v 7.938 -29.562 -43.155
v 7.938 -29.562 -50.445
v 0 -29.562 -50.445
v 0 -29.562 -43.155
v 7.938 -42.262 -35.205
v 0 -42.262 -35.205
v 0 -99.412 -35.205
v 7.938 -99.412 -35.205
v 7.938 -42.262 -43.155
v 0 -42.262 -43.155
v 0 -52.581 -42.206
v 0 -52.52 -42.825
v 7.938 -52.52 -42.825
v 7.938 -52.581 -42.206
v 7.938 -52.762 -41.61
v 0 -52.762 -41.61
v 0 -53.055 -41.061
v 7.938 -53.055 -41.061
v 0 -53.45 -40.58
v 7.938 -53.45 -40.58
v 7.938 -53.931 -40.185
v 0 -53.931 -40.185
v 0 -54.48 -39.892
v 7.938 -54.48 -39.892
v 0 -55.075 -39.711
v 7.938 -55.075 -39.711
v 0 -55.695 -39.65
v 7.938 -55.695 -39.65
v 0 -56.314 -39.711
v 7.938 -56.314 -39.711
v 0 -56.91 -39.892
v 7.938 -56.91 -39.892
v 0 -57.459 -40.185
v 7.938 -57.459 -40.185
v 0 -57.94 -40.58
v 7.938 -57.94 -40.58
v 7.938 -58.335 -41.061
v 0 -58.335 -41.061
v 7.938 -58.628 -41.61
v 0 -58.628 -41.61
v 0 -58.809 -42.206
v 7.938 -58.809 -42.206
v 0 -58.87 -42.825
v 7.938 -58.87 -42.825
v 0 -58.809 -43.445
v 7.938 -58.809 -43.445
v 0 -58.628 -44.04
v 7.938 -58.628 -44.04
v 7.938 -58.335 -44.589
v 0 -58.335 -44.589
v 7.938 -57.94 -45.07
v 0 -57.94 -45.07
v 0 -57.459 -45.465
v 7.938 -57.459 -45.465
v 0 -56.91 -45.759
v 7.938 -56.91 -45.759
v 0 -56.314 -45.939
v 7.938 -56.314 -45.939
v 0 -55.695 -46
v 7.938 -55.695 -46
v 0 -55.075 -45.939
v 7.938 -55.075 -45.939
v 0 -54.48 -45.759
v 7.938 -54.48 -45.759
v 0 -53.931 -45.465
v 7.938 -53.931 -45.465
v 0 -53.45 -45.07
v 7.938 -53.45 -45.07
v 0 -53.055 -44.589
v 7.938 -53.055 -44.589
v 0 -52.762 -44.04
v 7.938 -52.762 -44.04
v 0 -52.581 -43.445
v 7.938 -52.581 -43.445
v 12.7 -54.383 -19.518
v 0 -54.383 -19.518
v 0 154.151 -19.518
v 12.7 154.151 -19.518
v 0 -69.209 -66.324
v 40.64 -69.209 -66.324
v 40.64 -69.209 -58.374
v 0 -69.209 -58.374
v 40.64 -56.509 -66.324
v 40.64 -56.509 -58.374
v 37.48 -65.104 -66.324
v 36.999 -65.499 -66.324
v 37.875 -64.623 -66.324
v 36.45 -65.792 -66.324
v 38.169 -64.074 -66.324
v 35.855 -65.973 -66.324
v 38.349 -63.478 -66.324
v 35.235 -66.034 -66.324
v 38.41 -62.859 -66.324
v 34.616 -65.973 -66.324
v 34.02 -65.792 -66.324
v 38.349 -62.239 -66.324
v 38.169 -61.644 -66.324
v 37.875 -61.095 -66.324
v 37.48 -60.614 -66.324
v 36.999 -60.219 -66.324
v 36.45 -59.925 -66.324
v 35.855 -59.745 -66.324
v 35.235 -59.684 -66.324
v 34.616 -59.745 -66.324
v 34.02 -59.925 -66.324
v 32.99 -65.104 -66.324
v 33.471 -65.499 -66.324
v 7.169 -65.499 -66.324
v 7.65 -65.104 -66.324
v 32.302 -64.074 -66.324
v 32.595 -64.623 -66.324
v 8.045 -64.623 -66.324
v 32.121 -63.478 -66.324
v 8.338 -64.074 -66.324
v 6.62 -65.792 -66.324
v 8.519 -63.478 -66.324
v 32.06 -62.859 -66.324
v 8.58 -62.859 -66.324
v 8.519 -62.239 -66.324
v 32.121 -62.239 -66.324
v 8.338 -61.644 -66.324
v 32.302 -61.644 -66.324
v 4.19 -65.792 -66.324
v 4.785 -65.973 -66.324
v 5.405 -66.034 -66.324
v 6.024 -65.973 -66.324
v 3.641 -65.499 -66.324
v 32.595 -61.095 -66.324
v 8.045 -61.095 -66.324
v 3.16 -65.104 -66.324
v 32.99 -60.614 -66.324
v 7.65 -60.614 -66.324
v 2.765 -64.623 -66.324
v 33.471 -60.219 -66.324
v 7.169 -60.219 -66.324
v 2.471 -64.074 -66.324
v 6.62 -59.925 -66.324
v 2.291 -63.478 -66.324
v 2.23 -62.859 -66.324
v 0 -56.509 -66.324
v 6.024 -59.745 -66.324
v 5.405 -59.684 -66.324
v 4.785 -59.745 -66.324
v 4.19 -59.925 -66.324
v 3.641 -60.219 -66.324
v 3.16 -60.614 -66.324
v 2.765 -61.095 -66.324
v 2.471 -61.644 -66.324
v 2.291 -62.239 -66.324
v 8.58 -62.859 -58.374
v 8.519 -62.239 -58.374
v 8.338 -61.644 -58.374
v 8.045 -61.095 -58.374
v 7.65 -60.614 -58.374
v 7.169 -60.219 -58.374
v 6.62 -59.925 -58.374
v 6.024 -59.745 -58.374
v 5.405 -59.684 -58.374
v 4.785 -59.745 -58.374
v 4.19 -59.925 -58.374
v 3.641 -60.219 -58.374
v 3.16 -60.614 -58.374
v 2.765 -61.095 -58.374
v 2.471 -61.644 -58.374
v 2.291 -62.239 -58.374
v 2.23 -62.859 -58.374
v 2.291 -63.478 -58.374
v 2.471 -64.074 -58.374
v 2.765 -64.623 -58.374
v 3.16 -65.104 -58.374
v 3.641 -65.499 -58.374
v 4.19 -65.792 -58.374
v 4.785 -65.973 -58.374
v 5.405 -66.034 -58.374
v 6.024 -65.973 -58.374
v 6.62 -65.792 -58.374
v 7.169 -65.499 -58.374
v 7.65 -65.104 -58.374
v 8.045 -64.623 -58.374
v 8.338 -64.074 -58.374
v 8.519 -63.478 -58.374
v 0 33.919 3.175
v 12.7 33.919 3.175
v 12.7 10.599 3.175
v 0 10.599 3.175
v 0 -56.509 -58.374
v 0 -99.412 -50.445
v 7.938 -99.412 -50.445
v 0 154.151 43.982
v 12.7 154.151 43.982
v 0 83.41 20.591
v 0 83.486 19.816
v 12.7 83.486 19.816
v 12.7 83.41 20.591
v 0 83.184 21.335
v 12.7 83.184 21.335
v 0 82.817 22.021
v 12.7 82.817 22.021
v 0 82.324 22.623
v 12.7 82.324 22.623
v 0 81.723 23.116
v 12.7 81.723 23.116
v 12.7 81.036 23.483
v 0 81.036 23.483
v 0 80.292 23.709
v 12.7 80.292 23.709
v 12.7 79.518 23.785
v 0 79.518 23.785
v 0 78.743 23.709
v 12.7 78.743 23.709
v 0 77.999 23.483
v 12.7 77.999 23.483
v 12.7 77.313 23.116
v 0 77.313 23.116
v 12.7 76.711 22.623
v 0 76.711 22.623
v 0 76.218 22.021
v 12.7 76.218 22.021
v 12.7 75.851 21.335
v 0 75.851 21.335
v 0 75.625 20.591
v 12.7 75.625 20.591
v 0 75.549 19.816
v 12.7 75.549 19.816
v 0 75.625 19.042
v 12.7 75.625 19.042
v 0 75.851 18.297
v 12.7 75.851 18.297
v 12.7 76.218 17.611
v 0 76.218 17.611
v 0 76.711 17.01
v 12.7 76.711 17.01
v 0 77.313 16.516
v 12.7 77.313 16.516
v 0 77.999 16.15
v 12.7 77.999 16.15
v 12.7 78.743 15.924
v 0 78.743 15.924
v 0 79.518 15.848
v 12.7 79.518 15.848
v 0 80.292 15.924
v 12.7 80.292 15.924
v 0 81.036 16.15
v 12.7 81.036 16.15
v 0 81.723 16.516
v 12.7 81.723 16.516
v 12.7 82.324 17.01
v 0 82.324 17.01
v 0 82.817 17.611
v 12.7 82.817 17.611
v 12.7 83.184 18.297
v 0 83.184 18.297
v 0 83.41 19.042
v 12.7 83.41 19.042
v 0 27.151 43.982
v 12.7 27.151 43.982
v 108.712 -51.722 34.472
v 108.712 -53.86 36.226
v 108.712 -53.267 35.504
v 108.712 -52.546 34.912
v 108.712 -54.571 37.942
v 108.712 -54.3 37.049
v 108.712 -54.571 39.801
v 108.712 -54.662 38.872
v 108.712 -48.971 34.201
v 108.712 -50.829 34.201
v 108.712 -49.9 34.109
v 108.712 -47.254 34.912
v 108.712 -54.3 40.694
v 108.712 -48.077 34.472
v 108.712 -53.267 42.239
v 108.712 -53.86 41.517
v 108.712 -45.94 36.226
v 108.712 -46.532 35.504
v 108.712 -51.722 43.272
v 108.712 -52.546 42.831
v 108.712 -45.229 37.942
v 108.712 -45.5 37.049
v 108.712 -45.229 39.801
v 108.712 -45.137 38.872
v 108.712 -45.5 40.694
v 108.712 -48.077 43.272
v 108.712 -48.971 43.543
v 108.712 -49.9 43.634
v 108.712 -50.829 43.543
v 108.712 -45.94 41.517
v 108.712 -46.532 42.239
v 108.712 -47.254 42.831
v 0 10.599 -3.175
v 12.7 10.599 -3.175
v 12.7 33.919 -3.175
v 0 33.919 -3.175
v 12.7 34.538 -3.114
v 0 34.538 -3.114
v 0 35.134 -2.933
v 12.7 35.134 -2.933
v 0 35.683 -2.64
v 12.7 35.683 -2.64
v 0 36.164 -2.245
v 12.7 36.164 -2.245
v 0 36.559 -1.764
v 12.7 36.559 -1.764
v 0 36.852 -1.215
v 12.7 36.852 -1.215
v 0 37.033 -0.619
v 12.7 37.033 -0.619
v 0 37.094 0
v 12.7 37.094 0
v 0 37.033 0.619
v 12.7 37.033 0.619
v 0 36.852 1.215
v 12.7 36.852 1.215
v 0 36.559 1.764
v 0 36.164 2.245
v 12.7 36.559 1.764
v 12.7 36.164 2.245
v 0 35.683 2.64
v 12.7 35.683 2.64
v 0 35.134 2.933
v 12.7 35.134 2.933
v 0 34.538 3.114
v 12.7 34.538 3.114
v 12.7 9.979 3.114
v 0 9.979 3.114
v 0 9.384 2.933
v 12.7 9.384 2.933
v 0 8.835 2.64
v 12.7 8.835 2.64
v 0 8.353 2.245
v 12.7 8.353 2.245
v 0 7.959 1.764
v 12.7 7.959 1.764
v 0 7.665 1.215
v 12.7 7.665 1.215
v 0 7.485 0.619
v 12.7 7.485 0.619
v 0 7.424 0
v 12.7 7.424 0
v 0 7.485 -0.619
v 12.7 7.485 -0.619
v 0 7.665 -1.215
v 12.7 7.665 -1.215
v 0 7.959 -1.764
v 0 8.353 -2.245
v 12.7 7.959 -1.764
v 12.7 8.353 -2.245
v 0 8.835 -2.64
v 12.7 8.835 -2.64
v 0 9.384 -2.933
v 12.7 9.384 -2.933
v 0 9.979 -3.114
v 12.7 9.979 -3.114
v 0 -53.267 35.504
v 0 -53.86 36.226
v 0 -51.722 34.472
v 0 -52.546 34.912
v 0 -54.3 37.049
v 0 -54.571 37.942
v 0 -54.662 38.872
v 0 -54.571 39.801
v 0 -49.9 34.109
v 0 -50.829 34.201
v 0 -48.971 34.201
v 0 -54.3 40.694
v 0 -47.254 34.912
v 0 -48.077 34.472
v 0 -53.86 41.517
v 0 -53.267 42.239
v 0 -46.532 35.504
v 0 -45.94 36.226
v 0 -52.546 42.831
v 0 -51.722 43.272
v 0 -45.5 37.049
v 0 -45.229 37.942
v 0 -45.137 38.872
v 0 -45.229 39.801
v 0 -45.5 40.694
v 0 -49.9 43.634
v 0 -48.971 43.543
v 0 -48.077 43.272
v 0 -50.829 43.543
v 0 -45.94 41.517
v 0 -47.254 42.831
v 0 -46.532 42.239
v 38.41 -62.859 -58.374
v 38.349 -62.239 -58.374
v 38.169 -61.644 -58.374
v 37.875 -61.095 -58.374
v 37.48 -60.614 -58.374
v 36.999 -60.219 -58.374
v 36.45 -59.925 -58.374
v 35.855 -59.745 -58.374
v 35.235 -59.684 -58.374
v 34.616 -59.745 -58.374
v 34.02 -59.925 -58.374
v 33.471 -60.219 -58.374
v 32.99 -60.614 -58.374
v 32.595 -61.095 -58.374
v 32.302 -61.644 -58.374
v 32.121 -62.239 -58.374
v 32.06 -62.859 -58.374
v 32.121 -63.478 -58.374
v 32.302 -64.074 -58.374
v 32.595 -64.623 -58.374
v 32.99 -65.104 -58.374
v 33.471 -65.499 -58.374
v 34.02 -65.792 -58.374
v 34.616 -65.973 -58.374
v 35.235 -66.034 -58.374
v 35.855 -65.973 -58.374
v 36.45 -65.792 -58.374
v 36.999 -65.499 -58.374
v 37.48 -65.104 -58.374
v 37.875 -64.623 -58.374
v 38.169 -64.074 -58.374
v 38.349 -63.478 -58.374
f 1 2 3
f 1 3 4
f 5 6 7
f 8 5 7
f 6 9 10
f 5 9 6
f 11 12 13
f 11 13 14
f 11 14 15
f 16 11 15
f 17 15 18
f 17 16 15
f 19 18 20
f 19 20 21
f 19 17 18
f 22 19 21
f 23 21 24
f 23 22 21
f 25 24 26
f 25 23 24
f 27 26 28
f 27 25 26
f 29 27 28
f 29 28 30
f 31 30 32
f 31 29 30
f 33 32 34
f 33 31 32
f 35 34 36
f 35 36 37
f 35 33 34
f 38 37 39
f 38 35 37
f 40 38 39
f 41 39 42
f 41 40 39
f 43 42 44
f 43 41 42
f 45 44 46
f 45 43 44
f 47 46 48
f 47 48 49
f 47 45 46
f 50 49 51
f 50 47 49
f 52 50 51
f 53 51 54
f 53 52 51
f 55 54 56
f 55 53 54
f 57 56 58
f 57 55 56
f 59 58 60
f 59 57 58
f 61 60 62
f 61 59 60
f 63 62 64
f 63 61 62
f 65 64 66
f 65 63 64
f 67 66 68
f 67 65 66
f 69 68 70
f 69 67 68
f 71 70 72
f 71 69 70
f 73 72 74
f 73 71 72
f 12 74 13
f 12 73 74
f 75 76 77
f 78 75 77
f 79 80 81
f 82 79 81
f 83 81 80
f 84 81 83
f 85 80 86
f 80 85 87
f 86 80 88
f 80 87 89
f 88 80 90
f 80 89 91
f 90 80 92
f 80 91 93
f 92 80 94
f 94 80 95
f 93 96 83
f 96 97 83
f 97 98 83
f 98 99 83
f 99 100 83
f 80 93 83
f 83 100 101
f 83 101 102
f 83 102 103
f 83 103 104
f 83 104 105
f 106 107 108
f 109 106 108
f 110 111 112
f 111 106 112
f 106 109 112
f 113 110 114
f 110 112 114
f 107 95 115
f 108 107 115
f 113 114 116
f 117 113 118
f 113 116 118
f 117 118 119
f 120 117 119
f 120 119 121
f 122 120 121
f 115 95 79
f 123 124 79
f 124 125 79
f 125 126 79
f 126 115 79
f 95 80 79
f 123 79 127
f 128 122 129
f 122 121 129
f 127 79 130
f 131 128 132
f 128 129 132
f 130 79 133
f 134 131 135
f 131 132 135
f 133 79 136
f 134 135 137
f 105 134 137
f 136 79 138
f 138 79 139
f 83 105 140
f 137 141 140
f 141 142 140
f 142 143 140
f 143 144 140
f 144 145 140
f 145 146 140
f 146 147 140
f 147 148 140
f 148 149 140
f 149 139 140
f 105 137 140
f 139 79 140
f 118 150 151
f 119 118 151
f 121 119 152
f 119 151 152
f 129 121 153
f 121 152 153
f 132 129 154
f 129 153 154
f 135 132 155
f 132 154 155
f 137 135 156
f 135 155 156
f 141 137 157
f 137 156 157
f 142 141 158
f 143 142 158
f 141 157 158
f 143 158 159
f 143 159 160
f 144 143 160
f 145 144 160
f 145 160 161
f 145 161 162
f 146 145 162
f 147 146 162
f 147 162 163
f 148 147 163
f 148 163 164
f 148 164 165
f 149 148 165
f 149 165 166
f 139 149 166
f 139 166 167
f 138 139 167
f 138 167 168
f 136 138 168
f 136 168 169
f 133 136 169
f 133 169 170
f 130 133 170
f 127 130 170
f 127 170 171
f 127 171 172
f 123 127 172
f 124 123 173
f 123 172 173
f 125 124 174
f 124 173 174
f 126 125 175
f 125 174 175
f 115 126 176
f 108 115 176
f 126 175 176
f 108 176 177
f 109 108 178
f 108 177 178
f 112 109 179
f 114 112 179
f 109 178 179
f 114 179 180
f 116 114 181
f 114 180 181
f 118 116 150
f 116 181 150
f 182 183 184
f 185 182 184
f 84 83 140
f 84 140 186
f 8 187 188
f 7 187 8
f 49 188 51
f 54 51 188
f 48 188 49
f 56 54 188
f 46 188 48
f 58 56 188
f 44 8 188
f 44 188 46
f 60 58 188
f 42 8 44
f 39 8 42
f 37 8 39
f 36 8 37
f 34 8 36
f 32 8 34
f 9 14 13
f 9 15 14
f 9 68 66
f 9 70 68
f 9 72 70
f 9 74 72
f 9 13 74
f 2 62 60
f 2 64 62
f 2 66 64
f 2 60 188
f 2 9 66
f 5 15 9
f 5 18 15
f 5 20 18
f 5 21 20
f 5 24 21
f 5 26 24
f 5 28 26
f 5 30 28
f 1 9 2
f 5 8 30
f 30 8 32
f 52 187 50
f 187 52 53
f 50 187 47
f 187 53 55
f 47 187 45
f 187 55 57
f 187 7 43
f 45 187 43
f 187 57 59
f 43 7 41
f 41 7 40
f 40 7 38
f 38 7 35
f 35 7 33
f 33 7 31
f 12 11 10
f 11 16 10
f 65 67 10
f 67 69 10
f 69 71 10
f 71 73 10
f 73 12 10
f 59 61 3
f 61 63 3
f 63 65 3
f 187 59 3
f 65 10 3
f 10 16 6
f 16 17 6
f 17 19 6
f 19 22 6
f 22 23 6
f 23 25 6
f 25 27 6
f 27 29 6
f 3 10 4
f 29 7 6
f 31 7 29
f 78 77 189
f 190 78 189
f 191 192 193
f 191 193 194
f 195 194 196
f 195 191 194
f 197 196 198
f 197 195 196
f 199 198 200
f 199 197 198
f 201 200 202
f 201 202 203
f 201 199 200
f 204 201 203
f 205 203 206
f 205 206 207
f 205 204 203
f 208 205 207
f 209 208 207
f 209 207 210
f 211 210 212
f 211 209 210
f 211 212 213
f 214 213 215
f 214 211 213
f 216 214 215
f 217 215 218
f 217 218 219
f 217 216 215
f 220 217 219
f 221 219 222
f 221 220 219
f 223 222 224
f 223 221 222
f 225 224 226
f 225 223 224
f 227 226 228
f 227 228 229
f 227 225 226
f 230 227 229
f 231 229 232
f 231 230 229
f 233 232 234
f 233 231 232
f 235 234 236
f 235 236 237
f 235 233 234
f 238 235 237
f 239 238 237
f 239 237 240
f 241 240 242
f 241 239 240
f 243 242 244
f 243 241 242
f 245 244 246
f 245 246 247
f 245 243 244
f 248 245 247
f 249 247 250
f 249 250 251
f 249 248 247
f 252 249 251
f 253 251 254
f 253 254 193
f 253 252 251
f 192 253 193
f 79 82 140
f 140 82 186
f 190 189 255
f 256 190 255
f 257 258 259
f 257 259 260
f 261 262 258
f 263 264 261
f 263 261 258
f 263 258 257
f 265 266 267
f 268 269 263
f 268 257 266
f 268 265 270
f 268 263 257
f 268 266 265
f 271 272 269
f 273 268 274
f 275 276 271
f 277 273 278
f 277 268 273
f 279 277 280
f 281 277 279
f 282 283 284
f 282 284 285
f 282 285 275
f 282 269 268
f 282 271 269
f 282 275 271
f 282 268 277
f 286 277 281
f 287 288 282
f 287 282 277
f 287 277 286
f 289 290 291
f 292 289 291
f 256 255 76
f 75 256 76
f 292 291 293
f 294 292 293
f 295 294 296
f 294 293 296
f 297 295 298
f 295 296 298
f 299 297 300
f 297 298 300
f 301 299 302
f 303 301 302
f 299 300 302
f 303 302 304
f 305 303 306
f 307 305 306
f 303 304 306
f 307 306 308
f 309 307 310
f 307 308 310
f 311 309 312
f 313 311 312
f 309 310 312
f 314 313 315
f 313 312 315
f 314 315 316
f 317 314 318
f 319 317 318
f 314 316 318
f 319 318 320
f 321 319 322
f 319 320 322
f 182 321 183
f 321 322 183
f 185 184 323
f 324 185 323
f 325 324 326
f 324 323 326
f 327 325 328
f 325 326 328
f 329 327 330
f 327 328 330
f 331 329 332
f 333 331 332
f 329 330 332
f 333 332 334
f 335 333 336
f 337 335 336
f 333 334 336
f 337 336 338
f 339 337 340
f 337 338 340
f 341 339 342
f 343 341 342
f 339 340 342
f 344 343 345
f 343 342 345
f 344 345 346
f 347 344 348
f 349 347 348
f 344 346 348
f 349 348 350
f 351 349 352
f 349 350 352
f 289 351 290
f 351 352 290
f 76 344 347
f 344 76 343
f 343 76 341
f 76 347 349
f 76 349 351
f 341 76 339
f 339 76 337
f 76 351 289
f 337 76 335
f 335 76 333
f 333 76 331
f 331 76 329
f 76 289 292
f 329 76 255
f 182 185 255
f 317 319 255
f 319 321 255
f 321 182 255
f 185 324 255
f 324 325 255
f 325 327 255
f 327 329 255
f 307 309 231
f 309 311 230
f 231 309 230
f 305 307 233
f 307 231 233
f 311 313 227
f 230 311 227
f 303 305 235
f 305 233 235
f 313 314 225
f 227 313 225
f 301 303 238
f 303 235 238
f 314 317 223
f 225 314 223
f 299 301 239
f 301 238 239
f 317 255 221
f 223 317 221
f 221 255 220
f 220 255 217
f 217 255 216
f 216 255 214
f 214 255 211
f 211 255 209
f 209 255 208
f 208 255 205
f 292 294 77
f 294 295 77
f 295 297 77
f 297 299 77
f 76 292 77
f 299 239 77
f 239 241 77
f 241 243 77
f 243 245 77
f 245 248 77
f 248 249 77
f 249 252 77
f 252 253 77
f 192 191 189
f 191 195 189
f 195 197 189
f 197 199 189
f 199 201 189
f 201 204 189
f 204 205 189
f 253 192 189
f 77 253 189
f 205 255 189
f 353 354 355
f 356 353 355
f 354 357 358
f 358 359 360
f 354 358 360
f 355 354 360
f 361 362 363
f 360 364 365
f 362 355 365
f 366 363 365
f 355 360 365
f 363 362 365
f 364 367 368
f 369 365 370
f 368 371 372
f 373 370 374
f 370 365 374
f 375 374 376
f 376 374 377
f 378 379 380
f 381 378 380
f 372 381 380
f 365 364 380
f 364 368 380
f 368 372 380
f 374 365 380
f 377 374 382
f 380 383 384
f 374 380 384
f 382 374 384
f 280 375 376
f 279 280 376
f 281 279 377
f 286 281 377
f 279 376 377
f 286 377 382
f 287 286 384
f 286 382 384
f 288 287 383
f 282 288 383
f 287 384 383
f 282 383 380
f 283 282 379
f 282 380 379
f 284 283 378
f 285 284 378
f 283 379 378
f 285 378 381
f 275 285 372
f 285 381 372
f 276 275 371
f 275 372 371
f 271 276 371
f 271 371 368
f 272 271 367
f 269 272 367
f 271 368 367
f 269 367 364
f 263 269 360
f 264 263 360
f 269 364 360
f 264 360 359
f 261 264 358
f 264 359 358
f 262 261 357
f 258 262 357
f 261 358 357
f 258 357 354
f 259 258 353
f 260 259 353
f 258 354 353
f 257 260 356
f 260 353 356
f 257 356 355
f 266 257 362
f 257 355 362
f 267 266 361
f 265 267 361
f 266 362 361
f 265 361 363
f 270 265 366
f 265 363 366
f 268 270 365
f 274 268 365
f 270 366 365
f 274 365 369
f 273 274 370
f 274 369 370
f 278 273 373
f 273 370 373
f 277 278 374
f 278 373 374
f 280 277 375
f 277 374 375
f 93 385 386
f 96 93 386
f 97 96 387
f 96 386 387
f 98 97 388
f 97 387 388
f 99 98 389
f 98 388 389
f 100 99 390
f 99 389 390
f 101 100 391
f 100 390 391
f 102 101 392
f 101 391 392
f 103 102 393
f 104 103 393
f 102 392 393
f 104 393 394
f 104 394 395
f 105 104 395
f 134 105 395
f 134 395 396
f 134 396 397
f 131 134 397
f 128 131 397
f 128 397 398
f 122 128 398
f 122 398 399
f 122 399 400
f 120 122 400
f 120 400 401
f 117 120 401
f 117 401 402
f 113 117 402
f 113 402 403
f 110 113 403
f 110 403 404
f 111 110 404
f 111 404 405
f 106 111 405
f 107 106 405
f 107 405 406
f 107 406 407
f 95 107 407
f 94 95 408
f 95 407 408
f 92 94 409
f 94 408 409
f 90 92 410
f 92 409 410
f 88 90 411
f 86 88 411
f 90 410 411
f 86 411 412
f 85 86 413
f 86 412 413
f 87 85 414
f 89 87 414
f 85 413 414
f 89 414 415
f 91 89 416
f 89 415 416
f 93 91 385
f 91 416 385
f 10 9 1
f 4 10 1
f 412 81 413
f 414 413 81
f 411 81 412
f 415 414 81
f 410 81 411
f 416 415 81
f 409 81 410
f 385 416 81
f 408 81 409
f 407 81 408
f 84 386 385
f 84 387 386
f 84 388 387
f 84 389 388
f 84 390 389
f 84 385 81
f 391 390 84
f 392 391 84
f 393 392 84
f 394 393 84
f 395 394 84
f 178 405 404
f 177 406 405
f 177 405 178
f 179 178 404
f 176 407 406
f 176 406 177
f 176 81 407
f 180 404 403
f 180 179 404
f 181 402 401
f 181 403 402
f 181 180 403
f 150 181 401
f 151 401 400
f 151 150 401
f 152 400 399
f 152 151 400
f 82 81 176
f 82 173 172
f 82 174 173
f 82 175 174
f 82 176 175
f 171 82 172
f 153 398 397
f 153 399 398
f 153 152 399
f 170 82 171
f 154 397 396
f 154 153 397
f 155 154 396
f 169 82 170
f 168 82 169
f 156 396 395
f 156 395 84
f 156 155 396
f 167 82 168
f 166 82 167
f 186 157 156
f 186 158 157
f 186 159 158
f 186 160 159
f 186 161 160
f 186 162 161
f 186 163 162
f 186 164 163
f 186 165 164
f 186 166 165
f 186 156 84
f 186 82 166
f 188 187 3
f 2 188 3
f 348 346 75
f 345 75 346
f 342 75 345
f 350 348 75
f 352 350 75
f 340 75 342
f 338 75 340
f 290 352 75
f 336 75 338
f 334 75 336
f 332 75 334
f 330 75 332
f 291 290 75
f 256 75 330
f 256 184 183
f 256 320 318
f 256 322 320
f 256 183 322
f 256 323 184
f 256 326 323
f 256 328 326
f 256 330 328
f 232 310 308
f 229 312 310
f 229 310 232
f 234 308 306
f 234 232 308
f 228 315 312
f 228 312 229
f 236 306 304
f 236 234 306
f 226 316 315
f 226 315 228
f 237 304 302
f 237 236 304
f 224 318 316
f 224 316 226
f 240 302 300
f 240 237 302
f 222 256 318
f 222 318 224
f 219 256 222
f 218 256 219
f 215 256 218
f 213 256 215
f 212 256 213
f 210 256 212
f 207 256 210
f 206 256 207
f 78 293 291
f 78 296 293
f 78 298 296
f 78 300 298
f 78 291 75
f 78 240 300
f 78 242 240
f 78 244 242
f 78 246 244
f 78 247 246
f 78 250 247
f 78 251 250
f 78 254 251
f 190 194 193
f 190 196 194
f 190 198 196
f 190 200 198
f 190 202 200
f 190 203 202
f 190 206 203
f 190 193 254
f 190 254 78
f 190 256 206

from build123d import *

# Parameters (mm, degrees)
F0_R      = 3.96875
F1_DEPTH  = 12.7
F2_W      = 101.6
F2_H      = 7.9375
F3_DEPTH  = 42.418
F4_R      = 4.7625
F5_DEPTH  = 108.712
F7_DEPTH  = 12.7
F9_W      = 63.5
F9_H      = 15.24
F9_R      = 3.175
F9_W_2    = 6.35
F10_DEPTH = 7.9375
F11_W     = 12.7
F11_H     = 7.9502
F12_DEPTH = 40.64
F13_W     = 12.7
F13_H     = 7.9502
F14_DEPTH = 7.9385
F15_R     = 3.175
F16_DEPTH = 7.9512


with BuildPart() as f1:
    # F0 (on Right) → F1 (new body)
    with BuildSketch(Plane.YZ):
        Polygon((27.151039, 43.981731), (-54.382961, -19.518269), (154.151039, -19.518269), (154.151039, 43.981731), align=None)
        with Locations((79.517603, 19.816257)):
            Circle(F0_R, mode=Mode.SUBTRACT)
    extrude(amount=F1_DEPTH)

    # F6 (on face) → F7 (cut, through all)
    with BuildSketch(Plane.YZ.offset(12.7)):
        with BuildLine():
            Line((33.918817, 3.175), (10.598554, 3.175))
            ThreePointArc((10.598554, 3.175), (7.423554, 0), (10.598554, -3.175))
            Line((10.598554, -3.175), (33.918817, -3.175))
            ThreePointArc((33.918817, -3.175), (37.093817, 0), (33.918817, 3.175))
        make_face()
    extrude(amount=-F7_DEPTH, mode=Mode.SUBTRACT)


with BuildPart() as f3:
    # F2 (on Right) → F3 (new body)
    with BuildSketch(Plane.YZ):
        with Locations((25.378721, -45.944377)):
            Rectangle(F2_W, F2_H)
    extrude(amount=F3_DEPTH)


with BuildPart() as f5:
    # F4 (on Right) → F5 (new body)
    with BuildSketch(Plane.YZ):
        with Locations((-49.899653, 38.871575)):
            Circle(F4_R)
    extrude(amount=F5_DEPTH)


with BuildPart() as f10:
    # F9 (on Right) → F10 (new body)
    with BuildSketch(Plane.YZ):
        with Locations((-67.661913, -42.825252)):
            Rectangle(F9_W, F9_H)
        with Locations((-55.694822, -42.825252)):
            Circle(F9_R, mode=Mode.SUBTRACT)
        with Locations((-32.736913, -42.825252)):
            Rectangle(F9_W_2, F9_H)
    extrude(amount=F10_DEPTH)

    # F13 (on face) → F14 (cut, through all)
    with BuildSketch(Plane.YZ.offset(7.9375)):
        with Locations((-35.911913, -39.180352)):
            Rectangle(F13_W, F13_H)
    extrude(amount=-F14_DEPTH, mode=Mode.SUBTRACT)


with BuildPart() as f12:
    # F11 (on Right) → F12 (new body)
    with BuildSketch(Plane.YZ):
        with Locations((-62.858616, -62.348702)):
            Rectangle(F11_W, F11_H)
    extrude(amount=F12_DEPTH)

    # F15 (on face) → F16 (cut, through all)
    with BuildSketch(Plane.XY.offset(-58.373602)):
        with Locations((35.235196, -62.858616)):
            Circle(F15_R)
        with Locations((5.404804, -62.858616)):
            Circle(F15_R)
    extrude(amount=-F16_DEPTH, mode=Mode.SUBTRACT)


solid = Compound([f1.part, f5.part, f10.part, f12.part])
